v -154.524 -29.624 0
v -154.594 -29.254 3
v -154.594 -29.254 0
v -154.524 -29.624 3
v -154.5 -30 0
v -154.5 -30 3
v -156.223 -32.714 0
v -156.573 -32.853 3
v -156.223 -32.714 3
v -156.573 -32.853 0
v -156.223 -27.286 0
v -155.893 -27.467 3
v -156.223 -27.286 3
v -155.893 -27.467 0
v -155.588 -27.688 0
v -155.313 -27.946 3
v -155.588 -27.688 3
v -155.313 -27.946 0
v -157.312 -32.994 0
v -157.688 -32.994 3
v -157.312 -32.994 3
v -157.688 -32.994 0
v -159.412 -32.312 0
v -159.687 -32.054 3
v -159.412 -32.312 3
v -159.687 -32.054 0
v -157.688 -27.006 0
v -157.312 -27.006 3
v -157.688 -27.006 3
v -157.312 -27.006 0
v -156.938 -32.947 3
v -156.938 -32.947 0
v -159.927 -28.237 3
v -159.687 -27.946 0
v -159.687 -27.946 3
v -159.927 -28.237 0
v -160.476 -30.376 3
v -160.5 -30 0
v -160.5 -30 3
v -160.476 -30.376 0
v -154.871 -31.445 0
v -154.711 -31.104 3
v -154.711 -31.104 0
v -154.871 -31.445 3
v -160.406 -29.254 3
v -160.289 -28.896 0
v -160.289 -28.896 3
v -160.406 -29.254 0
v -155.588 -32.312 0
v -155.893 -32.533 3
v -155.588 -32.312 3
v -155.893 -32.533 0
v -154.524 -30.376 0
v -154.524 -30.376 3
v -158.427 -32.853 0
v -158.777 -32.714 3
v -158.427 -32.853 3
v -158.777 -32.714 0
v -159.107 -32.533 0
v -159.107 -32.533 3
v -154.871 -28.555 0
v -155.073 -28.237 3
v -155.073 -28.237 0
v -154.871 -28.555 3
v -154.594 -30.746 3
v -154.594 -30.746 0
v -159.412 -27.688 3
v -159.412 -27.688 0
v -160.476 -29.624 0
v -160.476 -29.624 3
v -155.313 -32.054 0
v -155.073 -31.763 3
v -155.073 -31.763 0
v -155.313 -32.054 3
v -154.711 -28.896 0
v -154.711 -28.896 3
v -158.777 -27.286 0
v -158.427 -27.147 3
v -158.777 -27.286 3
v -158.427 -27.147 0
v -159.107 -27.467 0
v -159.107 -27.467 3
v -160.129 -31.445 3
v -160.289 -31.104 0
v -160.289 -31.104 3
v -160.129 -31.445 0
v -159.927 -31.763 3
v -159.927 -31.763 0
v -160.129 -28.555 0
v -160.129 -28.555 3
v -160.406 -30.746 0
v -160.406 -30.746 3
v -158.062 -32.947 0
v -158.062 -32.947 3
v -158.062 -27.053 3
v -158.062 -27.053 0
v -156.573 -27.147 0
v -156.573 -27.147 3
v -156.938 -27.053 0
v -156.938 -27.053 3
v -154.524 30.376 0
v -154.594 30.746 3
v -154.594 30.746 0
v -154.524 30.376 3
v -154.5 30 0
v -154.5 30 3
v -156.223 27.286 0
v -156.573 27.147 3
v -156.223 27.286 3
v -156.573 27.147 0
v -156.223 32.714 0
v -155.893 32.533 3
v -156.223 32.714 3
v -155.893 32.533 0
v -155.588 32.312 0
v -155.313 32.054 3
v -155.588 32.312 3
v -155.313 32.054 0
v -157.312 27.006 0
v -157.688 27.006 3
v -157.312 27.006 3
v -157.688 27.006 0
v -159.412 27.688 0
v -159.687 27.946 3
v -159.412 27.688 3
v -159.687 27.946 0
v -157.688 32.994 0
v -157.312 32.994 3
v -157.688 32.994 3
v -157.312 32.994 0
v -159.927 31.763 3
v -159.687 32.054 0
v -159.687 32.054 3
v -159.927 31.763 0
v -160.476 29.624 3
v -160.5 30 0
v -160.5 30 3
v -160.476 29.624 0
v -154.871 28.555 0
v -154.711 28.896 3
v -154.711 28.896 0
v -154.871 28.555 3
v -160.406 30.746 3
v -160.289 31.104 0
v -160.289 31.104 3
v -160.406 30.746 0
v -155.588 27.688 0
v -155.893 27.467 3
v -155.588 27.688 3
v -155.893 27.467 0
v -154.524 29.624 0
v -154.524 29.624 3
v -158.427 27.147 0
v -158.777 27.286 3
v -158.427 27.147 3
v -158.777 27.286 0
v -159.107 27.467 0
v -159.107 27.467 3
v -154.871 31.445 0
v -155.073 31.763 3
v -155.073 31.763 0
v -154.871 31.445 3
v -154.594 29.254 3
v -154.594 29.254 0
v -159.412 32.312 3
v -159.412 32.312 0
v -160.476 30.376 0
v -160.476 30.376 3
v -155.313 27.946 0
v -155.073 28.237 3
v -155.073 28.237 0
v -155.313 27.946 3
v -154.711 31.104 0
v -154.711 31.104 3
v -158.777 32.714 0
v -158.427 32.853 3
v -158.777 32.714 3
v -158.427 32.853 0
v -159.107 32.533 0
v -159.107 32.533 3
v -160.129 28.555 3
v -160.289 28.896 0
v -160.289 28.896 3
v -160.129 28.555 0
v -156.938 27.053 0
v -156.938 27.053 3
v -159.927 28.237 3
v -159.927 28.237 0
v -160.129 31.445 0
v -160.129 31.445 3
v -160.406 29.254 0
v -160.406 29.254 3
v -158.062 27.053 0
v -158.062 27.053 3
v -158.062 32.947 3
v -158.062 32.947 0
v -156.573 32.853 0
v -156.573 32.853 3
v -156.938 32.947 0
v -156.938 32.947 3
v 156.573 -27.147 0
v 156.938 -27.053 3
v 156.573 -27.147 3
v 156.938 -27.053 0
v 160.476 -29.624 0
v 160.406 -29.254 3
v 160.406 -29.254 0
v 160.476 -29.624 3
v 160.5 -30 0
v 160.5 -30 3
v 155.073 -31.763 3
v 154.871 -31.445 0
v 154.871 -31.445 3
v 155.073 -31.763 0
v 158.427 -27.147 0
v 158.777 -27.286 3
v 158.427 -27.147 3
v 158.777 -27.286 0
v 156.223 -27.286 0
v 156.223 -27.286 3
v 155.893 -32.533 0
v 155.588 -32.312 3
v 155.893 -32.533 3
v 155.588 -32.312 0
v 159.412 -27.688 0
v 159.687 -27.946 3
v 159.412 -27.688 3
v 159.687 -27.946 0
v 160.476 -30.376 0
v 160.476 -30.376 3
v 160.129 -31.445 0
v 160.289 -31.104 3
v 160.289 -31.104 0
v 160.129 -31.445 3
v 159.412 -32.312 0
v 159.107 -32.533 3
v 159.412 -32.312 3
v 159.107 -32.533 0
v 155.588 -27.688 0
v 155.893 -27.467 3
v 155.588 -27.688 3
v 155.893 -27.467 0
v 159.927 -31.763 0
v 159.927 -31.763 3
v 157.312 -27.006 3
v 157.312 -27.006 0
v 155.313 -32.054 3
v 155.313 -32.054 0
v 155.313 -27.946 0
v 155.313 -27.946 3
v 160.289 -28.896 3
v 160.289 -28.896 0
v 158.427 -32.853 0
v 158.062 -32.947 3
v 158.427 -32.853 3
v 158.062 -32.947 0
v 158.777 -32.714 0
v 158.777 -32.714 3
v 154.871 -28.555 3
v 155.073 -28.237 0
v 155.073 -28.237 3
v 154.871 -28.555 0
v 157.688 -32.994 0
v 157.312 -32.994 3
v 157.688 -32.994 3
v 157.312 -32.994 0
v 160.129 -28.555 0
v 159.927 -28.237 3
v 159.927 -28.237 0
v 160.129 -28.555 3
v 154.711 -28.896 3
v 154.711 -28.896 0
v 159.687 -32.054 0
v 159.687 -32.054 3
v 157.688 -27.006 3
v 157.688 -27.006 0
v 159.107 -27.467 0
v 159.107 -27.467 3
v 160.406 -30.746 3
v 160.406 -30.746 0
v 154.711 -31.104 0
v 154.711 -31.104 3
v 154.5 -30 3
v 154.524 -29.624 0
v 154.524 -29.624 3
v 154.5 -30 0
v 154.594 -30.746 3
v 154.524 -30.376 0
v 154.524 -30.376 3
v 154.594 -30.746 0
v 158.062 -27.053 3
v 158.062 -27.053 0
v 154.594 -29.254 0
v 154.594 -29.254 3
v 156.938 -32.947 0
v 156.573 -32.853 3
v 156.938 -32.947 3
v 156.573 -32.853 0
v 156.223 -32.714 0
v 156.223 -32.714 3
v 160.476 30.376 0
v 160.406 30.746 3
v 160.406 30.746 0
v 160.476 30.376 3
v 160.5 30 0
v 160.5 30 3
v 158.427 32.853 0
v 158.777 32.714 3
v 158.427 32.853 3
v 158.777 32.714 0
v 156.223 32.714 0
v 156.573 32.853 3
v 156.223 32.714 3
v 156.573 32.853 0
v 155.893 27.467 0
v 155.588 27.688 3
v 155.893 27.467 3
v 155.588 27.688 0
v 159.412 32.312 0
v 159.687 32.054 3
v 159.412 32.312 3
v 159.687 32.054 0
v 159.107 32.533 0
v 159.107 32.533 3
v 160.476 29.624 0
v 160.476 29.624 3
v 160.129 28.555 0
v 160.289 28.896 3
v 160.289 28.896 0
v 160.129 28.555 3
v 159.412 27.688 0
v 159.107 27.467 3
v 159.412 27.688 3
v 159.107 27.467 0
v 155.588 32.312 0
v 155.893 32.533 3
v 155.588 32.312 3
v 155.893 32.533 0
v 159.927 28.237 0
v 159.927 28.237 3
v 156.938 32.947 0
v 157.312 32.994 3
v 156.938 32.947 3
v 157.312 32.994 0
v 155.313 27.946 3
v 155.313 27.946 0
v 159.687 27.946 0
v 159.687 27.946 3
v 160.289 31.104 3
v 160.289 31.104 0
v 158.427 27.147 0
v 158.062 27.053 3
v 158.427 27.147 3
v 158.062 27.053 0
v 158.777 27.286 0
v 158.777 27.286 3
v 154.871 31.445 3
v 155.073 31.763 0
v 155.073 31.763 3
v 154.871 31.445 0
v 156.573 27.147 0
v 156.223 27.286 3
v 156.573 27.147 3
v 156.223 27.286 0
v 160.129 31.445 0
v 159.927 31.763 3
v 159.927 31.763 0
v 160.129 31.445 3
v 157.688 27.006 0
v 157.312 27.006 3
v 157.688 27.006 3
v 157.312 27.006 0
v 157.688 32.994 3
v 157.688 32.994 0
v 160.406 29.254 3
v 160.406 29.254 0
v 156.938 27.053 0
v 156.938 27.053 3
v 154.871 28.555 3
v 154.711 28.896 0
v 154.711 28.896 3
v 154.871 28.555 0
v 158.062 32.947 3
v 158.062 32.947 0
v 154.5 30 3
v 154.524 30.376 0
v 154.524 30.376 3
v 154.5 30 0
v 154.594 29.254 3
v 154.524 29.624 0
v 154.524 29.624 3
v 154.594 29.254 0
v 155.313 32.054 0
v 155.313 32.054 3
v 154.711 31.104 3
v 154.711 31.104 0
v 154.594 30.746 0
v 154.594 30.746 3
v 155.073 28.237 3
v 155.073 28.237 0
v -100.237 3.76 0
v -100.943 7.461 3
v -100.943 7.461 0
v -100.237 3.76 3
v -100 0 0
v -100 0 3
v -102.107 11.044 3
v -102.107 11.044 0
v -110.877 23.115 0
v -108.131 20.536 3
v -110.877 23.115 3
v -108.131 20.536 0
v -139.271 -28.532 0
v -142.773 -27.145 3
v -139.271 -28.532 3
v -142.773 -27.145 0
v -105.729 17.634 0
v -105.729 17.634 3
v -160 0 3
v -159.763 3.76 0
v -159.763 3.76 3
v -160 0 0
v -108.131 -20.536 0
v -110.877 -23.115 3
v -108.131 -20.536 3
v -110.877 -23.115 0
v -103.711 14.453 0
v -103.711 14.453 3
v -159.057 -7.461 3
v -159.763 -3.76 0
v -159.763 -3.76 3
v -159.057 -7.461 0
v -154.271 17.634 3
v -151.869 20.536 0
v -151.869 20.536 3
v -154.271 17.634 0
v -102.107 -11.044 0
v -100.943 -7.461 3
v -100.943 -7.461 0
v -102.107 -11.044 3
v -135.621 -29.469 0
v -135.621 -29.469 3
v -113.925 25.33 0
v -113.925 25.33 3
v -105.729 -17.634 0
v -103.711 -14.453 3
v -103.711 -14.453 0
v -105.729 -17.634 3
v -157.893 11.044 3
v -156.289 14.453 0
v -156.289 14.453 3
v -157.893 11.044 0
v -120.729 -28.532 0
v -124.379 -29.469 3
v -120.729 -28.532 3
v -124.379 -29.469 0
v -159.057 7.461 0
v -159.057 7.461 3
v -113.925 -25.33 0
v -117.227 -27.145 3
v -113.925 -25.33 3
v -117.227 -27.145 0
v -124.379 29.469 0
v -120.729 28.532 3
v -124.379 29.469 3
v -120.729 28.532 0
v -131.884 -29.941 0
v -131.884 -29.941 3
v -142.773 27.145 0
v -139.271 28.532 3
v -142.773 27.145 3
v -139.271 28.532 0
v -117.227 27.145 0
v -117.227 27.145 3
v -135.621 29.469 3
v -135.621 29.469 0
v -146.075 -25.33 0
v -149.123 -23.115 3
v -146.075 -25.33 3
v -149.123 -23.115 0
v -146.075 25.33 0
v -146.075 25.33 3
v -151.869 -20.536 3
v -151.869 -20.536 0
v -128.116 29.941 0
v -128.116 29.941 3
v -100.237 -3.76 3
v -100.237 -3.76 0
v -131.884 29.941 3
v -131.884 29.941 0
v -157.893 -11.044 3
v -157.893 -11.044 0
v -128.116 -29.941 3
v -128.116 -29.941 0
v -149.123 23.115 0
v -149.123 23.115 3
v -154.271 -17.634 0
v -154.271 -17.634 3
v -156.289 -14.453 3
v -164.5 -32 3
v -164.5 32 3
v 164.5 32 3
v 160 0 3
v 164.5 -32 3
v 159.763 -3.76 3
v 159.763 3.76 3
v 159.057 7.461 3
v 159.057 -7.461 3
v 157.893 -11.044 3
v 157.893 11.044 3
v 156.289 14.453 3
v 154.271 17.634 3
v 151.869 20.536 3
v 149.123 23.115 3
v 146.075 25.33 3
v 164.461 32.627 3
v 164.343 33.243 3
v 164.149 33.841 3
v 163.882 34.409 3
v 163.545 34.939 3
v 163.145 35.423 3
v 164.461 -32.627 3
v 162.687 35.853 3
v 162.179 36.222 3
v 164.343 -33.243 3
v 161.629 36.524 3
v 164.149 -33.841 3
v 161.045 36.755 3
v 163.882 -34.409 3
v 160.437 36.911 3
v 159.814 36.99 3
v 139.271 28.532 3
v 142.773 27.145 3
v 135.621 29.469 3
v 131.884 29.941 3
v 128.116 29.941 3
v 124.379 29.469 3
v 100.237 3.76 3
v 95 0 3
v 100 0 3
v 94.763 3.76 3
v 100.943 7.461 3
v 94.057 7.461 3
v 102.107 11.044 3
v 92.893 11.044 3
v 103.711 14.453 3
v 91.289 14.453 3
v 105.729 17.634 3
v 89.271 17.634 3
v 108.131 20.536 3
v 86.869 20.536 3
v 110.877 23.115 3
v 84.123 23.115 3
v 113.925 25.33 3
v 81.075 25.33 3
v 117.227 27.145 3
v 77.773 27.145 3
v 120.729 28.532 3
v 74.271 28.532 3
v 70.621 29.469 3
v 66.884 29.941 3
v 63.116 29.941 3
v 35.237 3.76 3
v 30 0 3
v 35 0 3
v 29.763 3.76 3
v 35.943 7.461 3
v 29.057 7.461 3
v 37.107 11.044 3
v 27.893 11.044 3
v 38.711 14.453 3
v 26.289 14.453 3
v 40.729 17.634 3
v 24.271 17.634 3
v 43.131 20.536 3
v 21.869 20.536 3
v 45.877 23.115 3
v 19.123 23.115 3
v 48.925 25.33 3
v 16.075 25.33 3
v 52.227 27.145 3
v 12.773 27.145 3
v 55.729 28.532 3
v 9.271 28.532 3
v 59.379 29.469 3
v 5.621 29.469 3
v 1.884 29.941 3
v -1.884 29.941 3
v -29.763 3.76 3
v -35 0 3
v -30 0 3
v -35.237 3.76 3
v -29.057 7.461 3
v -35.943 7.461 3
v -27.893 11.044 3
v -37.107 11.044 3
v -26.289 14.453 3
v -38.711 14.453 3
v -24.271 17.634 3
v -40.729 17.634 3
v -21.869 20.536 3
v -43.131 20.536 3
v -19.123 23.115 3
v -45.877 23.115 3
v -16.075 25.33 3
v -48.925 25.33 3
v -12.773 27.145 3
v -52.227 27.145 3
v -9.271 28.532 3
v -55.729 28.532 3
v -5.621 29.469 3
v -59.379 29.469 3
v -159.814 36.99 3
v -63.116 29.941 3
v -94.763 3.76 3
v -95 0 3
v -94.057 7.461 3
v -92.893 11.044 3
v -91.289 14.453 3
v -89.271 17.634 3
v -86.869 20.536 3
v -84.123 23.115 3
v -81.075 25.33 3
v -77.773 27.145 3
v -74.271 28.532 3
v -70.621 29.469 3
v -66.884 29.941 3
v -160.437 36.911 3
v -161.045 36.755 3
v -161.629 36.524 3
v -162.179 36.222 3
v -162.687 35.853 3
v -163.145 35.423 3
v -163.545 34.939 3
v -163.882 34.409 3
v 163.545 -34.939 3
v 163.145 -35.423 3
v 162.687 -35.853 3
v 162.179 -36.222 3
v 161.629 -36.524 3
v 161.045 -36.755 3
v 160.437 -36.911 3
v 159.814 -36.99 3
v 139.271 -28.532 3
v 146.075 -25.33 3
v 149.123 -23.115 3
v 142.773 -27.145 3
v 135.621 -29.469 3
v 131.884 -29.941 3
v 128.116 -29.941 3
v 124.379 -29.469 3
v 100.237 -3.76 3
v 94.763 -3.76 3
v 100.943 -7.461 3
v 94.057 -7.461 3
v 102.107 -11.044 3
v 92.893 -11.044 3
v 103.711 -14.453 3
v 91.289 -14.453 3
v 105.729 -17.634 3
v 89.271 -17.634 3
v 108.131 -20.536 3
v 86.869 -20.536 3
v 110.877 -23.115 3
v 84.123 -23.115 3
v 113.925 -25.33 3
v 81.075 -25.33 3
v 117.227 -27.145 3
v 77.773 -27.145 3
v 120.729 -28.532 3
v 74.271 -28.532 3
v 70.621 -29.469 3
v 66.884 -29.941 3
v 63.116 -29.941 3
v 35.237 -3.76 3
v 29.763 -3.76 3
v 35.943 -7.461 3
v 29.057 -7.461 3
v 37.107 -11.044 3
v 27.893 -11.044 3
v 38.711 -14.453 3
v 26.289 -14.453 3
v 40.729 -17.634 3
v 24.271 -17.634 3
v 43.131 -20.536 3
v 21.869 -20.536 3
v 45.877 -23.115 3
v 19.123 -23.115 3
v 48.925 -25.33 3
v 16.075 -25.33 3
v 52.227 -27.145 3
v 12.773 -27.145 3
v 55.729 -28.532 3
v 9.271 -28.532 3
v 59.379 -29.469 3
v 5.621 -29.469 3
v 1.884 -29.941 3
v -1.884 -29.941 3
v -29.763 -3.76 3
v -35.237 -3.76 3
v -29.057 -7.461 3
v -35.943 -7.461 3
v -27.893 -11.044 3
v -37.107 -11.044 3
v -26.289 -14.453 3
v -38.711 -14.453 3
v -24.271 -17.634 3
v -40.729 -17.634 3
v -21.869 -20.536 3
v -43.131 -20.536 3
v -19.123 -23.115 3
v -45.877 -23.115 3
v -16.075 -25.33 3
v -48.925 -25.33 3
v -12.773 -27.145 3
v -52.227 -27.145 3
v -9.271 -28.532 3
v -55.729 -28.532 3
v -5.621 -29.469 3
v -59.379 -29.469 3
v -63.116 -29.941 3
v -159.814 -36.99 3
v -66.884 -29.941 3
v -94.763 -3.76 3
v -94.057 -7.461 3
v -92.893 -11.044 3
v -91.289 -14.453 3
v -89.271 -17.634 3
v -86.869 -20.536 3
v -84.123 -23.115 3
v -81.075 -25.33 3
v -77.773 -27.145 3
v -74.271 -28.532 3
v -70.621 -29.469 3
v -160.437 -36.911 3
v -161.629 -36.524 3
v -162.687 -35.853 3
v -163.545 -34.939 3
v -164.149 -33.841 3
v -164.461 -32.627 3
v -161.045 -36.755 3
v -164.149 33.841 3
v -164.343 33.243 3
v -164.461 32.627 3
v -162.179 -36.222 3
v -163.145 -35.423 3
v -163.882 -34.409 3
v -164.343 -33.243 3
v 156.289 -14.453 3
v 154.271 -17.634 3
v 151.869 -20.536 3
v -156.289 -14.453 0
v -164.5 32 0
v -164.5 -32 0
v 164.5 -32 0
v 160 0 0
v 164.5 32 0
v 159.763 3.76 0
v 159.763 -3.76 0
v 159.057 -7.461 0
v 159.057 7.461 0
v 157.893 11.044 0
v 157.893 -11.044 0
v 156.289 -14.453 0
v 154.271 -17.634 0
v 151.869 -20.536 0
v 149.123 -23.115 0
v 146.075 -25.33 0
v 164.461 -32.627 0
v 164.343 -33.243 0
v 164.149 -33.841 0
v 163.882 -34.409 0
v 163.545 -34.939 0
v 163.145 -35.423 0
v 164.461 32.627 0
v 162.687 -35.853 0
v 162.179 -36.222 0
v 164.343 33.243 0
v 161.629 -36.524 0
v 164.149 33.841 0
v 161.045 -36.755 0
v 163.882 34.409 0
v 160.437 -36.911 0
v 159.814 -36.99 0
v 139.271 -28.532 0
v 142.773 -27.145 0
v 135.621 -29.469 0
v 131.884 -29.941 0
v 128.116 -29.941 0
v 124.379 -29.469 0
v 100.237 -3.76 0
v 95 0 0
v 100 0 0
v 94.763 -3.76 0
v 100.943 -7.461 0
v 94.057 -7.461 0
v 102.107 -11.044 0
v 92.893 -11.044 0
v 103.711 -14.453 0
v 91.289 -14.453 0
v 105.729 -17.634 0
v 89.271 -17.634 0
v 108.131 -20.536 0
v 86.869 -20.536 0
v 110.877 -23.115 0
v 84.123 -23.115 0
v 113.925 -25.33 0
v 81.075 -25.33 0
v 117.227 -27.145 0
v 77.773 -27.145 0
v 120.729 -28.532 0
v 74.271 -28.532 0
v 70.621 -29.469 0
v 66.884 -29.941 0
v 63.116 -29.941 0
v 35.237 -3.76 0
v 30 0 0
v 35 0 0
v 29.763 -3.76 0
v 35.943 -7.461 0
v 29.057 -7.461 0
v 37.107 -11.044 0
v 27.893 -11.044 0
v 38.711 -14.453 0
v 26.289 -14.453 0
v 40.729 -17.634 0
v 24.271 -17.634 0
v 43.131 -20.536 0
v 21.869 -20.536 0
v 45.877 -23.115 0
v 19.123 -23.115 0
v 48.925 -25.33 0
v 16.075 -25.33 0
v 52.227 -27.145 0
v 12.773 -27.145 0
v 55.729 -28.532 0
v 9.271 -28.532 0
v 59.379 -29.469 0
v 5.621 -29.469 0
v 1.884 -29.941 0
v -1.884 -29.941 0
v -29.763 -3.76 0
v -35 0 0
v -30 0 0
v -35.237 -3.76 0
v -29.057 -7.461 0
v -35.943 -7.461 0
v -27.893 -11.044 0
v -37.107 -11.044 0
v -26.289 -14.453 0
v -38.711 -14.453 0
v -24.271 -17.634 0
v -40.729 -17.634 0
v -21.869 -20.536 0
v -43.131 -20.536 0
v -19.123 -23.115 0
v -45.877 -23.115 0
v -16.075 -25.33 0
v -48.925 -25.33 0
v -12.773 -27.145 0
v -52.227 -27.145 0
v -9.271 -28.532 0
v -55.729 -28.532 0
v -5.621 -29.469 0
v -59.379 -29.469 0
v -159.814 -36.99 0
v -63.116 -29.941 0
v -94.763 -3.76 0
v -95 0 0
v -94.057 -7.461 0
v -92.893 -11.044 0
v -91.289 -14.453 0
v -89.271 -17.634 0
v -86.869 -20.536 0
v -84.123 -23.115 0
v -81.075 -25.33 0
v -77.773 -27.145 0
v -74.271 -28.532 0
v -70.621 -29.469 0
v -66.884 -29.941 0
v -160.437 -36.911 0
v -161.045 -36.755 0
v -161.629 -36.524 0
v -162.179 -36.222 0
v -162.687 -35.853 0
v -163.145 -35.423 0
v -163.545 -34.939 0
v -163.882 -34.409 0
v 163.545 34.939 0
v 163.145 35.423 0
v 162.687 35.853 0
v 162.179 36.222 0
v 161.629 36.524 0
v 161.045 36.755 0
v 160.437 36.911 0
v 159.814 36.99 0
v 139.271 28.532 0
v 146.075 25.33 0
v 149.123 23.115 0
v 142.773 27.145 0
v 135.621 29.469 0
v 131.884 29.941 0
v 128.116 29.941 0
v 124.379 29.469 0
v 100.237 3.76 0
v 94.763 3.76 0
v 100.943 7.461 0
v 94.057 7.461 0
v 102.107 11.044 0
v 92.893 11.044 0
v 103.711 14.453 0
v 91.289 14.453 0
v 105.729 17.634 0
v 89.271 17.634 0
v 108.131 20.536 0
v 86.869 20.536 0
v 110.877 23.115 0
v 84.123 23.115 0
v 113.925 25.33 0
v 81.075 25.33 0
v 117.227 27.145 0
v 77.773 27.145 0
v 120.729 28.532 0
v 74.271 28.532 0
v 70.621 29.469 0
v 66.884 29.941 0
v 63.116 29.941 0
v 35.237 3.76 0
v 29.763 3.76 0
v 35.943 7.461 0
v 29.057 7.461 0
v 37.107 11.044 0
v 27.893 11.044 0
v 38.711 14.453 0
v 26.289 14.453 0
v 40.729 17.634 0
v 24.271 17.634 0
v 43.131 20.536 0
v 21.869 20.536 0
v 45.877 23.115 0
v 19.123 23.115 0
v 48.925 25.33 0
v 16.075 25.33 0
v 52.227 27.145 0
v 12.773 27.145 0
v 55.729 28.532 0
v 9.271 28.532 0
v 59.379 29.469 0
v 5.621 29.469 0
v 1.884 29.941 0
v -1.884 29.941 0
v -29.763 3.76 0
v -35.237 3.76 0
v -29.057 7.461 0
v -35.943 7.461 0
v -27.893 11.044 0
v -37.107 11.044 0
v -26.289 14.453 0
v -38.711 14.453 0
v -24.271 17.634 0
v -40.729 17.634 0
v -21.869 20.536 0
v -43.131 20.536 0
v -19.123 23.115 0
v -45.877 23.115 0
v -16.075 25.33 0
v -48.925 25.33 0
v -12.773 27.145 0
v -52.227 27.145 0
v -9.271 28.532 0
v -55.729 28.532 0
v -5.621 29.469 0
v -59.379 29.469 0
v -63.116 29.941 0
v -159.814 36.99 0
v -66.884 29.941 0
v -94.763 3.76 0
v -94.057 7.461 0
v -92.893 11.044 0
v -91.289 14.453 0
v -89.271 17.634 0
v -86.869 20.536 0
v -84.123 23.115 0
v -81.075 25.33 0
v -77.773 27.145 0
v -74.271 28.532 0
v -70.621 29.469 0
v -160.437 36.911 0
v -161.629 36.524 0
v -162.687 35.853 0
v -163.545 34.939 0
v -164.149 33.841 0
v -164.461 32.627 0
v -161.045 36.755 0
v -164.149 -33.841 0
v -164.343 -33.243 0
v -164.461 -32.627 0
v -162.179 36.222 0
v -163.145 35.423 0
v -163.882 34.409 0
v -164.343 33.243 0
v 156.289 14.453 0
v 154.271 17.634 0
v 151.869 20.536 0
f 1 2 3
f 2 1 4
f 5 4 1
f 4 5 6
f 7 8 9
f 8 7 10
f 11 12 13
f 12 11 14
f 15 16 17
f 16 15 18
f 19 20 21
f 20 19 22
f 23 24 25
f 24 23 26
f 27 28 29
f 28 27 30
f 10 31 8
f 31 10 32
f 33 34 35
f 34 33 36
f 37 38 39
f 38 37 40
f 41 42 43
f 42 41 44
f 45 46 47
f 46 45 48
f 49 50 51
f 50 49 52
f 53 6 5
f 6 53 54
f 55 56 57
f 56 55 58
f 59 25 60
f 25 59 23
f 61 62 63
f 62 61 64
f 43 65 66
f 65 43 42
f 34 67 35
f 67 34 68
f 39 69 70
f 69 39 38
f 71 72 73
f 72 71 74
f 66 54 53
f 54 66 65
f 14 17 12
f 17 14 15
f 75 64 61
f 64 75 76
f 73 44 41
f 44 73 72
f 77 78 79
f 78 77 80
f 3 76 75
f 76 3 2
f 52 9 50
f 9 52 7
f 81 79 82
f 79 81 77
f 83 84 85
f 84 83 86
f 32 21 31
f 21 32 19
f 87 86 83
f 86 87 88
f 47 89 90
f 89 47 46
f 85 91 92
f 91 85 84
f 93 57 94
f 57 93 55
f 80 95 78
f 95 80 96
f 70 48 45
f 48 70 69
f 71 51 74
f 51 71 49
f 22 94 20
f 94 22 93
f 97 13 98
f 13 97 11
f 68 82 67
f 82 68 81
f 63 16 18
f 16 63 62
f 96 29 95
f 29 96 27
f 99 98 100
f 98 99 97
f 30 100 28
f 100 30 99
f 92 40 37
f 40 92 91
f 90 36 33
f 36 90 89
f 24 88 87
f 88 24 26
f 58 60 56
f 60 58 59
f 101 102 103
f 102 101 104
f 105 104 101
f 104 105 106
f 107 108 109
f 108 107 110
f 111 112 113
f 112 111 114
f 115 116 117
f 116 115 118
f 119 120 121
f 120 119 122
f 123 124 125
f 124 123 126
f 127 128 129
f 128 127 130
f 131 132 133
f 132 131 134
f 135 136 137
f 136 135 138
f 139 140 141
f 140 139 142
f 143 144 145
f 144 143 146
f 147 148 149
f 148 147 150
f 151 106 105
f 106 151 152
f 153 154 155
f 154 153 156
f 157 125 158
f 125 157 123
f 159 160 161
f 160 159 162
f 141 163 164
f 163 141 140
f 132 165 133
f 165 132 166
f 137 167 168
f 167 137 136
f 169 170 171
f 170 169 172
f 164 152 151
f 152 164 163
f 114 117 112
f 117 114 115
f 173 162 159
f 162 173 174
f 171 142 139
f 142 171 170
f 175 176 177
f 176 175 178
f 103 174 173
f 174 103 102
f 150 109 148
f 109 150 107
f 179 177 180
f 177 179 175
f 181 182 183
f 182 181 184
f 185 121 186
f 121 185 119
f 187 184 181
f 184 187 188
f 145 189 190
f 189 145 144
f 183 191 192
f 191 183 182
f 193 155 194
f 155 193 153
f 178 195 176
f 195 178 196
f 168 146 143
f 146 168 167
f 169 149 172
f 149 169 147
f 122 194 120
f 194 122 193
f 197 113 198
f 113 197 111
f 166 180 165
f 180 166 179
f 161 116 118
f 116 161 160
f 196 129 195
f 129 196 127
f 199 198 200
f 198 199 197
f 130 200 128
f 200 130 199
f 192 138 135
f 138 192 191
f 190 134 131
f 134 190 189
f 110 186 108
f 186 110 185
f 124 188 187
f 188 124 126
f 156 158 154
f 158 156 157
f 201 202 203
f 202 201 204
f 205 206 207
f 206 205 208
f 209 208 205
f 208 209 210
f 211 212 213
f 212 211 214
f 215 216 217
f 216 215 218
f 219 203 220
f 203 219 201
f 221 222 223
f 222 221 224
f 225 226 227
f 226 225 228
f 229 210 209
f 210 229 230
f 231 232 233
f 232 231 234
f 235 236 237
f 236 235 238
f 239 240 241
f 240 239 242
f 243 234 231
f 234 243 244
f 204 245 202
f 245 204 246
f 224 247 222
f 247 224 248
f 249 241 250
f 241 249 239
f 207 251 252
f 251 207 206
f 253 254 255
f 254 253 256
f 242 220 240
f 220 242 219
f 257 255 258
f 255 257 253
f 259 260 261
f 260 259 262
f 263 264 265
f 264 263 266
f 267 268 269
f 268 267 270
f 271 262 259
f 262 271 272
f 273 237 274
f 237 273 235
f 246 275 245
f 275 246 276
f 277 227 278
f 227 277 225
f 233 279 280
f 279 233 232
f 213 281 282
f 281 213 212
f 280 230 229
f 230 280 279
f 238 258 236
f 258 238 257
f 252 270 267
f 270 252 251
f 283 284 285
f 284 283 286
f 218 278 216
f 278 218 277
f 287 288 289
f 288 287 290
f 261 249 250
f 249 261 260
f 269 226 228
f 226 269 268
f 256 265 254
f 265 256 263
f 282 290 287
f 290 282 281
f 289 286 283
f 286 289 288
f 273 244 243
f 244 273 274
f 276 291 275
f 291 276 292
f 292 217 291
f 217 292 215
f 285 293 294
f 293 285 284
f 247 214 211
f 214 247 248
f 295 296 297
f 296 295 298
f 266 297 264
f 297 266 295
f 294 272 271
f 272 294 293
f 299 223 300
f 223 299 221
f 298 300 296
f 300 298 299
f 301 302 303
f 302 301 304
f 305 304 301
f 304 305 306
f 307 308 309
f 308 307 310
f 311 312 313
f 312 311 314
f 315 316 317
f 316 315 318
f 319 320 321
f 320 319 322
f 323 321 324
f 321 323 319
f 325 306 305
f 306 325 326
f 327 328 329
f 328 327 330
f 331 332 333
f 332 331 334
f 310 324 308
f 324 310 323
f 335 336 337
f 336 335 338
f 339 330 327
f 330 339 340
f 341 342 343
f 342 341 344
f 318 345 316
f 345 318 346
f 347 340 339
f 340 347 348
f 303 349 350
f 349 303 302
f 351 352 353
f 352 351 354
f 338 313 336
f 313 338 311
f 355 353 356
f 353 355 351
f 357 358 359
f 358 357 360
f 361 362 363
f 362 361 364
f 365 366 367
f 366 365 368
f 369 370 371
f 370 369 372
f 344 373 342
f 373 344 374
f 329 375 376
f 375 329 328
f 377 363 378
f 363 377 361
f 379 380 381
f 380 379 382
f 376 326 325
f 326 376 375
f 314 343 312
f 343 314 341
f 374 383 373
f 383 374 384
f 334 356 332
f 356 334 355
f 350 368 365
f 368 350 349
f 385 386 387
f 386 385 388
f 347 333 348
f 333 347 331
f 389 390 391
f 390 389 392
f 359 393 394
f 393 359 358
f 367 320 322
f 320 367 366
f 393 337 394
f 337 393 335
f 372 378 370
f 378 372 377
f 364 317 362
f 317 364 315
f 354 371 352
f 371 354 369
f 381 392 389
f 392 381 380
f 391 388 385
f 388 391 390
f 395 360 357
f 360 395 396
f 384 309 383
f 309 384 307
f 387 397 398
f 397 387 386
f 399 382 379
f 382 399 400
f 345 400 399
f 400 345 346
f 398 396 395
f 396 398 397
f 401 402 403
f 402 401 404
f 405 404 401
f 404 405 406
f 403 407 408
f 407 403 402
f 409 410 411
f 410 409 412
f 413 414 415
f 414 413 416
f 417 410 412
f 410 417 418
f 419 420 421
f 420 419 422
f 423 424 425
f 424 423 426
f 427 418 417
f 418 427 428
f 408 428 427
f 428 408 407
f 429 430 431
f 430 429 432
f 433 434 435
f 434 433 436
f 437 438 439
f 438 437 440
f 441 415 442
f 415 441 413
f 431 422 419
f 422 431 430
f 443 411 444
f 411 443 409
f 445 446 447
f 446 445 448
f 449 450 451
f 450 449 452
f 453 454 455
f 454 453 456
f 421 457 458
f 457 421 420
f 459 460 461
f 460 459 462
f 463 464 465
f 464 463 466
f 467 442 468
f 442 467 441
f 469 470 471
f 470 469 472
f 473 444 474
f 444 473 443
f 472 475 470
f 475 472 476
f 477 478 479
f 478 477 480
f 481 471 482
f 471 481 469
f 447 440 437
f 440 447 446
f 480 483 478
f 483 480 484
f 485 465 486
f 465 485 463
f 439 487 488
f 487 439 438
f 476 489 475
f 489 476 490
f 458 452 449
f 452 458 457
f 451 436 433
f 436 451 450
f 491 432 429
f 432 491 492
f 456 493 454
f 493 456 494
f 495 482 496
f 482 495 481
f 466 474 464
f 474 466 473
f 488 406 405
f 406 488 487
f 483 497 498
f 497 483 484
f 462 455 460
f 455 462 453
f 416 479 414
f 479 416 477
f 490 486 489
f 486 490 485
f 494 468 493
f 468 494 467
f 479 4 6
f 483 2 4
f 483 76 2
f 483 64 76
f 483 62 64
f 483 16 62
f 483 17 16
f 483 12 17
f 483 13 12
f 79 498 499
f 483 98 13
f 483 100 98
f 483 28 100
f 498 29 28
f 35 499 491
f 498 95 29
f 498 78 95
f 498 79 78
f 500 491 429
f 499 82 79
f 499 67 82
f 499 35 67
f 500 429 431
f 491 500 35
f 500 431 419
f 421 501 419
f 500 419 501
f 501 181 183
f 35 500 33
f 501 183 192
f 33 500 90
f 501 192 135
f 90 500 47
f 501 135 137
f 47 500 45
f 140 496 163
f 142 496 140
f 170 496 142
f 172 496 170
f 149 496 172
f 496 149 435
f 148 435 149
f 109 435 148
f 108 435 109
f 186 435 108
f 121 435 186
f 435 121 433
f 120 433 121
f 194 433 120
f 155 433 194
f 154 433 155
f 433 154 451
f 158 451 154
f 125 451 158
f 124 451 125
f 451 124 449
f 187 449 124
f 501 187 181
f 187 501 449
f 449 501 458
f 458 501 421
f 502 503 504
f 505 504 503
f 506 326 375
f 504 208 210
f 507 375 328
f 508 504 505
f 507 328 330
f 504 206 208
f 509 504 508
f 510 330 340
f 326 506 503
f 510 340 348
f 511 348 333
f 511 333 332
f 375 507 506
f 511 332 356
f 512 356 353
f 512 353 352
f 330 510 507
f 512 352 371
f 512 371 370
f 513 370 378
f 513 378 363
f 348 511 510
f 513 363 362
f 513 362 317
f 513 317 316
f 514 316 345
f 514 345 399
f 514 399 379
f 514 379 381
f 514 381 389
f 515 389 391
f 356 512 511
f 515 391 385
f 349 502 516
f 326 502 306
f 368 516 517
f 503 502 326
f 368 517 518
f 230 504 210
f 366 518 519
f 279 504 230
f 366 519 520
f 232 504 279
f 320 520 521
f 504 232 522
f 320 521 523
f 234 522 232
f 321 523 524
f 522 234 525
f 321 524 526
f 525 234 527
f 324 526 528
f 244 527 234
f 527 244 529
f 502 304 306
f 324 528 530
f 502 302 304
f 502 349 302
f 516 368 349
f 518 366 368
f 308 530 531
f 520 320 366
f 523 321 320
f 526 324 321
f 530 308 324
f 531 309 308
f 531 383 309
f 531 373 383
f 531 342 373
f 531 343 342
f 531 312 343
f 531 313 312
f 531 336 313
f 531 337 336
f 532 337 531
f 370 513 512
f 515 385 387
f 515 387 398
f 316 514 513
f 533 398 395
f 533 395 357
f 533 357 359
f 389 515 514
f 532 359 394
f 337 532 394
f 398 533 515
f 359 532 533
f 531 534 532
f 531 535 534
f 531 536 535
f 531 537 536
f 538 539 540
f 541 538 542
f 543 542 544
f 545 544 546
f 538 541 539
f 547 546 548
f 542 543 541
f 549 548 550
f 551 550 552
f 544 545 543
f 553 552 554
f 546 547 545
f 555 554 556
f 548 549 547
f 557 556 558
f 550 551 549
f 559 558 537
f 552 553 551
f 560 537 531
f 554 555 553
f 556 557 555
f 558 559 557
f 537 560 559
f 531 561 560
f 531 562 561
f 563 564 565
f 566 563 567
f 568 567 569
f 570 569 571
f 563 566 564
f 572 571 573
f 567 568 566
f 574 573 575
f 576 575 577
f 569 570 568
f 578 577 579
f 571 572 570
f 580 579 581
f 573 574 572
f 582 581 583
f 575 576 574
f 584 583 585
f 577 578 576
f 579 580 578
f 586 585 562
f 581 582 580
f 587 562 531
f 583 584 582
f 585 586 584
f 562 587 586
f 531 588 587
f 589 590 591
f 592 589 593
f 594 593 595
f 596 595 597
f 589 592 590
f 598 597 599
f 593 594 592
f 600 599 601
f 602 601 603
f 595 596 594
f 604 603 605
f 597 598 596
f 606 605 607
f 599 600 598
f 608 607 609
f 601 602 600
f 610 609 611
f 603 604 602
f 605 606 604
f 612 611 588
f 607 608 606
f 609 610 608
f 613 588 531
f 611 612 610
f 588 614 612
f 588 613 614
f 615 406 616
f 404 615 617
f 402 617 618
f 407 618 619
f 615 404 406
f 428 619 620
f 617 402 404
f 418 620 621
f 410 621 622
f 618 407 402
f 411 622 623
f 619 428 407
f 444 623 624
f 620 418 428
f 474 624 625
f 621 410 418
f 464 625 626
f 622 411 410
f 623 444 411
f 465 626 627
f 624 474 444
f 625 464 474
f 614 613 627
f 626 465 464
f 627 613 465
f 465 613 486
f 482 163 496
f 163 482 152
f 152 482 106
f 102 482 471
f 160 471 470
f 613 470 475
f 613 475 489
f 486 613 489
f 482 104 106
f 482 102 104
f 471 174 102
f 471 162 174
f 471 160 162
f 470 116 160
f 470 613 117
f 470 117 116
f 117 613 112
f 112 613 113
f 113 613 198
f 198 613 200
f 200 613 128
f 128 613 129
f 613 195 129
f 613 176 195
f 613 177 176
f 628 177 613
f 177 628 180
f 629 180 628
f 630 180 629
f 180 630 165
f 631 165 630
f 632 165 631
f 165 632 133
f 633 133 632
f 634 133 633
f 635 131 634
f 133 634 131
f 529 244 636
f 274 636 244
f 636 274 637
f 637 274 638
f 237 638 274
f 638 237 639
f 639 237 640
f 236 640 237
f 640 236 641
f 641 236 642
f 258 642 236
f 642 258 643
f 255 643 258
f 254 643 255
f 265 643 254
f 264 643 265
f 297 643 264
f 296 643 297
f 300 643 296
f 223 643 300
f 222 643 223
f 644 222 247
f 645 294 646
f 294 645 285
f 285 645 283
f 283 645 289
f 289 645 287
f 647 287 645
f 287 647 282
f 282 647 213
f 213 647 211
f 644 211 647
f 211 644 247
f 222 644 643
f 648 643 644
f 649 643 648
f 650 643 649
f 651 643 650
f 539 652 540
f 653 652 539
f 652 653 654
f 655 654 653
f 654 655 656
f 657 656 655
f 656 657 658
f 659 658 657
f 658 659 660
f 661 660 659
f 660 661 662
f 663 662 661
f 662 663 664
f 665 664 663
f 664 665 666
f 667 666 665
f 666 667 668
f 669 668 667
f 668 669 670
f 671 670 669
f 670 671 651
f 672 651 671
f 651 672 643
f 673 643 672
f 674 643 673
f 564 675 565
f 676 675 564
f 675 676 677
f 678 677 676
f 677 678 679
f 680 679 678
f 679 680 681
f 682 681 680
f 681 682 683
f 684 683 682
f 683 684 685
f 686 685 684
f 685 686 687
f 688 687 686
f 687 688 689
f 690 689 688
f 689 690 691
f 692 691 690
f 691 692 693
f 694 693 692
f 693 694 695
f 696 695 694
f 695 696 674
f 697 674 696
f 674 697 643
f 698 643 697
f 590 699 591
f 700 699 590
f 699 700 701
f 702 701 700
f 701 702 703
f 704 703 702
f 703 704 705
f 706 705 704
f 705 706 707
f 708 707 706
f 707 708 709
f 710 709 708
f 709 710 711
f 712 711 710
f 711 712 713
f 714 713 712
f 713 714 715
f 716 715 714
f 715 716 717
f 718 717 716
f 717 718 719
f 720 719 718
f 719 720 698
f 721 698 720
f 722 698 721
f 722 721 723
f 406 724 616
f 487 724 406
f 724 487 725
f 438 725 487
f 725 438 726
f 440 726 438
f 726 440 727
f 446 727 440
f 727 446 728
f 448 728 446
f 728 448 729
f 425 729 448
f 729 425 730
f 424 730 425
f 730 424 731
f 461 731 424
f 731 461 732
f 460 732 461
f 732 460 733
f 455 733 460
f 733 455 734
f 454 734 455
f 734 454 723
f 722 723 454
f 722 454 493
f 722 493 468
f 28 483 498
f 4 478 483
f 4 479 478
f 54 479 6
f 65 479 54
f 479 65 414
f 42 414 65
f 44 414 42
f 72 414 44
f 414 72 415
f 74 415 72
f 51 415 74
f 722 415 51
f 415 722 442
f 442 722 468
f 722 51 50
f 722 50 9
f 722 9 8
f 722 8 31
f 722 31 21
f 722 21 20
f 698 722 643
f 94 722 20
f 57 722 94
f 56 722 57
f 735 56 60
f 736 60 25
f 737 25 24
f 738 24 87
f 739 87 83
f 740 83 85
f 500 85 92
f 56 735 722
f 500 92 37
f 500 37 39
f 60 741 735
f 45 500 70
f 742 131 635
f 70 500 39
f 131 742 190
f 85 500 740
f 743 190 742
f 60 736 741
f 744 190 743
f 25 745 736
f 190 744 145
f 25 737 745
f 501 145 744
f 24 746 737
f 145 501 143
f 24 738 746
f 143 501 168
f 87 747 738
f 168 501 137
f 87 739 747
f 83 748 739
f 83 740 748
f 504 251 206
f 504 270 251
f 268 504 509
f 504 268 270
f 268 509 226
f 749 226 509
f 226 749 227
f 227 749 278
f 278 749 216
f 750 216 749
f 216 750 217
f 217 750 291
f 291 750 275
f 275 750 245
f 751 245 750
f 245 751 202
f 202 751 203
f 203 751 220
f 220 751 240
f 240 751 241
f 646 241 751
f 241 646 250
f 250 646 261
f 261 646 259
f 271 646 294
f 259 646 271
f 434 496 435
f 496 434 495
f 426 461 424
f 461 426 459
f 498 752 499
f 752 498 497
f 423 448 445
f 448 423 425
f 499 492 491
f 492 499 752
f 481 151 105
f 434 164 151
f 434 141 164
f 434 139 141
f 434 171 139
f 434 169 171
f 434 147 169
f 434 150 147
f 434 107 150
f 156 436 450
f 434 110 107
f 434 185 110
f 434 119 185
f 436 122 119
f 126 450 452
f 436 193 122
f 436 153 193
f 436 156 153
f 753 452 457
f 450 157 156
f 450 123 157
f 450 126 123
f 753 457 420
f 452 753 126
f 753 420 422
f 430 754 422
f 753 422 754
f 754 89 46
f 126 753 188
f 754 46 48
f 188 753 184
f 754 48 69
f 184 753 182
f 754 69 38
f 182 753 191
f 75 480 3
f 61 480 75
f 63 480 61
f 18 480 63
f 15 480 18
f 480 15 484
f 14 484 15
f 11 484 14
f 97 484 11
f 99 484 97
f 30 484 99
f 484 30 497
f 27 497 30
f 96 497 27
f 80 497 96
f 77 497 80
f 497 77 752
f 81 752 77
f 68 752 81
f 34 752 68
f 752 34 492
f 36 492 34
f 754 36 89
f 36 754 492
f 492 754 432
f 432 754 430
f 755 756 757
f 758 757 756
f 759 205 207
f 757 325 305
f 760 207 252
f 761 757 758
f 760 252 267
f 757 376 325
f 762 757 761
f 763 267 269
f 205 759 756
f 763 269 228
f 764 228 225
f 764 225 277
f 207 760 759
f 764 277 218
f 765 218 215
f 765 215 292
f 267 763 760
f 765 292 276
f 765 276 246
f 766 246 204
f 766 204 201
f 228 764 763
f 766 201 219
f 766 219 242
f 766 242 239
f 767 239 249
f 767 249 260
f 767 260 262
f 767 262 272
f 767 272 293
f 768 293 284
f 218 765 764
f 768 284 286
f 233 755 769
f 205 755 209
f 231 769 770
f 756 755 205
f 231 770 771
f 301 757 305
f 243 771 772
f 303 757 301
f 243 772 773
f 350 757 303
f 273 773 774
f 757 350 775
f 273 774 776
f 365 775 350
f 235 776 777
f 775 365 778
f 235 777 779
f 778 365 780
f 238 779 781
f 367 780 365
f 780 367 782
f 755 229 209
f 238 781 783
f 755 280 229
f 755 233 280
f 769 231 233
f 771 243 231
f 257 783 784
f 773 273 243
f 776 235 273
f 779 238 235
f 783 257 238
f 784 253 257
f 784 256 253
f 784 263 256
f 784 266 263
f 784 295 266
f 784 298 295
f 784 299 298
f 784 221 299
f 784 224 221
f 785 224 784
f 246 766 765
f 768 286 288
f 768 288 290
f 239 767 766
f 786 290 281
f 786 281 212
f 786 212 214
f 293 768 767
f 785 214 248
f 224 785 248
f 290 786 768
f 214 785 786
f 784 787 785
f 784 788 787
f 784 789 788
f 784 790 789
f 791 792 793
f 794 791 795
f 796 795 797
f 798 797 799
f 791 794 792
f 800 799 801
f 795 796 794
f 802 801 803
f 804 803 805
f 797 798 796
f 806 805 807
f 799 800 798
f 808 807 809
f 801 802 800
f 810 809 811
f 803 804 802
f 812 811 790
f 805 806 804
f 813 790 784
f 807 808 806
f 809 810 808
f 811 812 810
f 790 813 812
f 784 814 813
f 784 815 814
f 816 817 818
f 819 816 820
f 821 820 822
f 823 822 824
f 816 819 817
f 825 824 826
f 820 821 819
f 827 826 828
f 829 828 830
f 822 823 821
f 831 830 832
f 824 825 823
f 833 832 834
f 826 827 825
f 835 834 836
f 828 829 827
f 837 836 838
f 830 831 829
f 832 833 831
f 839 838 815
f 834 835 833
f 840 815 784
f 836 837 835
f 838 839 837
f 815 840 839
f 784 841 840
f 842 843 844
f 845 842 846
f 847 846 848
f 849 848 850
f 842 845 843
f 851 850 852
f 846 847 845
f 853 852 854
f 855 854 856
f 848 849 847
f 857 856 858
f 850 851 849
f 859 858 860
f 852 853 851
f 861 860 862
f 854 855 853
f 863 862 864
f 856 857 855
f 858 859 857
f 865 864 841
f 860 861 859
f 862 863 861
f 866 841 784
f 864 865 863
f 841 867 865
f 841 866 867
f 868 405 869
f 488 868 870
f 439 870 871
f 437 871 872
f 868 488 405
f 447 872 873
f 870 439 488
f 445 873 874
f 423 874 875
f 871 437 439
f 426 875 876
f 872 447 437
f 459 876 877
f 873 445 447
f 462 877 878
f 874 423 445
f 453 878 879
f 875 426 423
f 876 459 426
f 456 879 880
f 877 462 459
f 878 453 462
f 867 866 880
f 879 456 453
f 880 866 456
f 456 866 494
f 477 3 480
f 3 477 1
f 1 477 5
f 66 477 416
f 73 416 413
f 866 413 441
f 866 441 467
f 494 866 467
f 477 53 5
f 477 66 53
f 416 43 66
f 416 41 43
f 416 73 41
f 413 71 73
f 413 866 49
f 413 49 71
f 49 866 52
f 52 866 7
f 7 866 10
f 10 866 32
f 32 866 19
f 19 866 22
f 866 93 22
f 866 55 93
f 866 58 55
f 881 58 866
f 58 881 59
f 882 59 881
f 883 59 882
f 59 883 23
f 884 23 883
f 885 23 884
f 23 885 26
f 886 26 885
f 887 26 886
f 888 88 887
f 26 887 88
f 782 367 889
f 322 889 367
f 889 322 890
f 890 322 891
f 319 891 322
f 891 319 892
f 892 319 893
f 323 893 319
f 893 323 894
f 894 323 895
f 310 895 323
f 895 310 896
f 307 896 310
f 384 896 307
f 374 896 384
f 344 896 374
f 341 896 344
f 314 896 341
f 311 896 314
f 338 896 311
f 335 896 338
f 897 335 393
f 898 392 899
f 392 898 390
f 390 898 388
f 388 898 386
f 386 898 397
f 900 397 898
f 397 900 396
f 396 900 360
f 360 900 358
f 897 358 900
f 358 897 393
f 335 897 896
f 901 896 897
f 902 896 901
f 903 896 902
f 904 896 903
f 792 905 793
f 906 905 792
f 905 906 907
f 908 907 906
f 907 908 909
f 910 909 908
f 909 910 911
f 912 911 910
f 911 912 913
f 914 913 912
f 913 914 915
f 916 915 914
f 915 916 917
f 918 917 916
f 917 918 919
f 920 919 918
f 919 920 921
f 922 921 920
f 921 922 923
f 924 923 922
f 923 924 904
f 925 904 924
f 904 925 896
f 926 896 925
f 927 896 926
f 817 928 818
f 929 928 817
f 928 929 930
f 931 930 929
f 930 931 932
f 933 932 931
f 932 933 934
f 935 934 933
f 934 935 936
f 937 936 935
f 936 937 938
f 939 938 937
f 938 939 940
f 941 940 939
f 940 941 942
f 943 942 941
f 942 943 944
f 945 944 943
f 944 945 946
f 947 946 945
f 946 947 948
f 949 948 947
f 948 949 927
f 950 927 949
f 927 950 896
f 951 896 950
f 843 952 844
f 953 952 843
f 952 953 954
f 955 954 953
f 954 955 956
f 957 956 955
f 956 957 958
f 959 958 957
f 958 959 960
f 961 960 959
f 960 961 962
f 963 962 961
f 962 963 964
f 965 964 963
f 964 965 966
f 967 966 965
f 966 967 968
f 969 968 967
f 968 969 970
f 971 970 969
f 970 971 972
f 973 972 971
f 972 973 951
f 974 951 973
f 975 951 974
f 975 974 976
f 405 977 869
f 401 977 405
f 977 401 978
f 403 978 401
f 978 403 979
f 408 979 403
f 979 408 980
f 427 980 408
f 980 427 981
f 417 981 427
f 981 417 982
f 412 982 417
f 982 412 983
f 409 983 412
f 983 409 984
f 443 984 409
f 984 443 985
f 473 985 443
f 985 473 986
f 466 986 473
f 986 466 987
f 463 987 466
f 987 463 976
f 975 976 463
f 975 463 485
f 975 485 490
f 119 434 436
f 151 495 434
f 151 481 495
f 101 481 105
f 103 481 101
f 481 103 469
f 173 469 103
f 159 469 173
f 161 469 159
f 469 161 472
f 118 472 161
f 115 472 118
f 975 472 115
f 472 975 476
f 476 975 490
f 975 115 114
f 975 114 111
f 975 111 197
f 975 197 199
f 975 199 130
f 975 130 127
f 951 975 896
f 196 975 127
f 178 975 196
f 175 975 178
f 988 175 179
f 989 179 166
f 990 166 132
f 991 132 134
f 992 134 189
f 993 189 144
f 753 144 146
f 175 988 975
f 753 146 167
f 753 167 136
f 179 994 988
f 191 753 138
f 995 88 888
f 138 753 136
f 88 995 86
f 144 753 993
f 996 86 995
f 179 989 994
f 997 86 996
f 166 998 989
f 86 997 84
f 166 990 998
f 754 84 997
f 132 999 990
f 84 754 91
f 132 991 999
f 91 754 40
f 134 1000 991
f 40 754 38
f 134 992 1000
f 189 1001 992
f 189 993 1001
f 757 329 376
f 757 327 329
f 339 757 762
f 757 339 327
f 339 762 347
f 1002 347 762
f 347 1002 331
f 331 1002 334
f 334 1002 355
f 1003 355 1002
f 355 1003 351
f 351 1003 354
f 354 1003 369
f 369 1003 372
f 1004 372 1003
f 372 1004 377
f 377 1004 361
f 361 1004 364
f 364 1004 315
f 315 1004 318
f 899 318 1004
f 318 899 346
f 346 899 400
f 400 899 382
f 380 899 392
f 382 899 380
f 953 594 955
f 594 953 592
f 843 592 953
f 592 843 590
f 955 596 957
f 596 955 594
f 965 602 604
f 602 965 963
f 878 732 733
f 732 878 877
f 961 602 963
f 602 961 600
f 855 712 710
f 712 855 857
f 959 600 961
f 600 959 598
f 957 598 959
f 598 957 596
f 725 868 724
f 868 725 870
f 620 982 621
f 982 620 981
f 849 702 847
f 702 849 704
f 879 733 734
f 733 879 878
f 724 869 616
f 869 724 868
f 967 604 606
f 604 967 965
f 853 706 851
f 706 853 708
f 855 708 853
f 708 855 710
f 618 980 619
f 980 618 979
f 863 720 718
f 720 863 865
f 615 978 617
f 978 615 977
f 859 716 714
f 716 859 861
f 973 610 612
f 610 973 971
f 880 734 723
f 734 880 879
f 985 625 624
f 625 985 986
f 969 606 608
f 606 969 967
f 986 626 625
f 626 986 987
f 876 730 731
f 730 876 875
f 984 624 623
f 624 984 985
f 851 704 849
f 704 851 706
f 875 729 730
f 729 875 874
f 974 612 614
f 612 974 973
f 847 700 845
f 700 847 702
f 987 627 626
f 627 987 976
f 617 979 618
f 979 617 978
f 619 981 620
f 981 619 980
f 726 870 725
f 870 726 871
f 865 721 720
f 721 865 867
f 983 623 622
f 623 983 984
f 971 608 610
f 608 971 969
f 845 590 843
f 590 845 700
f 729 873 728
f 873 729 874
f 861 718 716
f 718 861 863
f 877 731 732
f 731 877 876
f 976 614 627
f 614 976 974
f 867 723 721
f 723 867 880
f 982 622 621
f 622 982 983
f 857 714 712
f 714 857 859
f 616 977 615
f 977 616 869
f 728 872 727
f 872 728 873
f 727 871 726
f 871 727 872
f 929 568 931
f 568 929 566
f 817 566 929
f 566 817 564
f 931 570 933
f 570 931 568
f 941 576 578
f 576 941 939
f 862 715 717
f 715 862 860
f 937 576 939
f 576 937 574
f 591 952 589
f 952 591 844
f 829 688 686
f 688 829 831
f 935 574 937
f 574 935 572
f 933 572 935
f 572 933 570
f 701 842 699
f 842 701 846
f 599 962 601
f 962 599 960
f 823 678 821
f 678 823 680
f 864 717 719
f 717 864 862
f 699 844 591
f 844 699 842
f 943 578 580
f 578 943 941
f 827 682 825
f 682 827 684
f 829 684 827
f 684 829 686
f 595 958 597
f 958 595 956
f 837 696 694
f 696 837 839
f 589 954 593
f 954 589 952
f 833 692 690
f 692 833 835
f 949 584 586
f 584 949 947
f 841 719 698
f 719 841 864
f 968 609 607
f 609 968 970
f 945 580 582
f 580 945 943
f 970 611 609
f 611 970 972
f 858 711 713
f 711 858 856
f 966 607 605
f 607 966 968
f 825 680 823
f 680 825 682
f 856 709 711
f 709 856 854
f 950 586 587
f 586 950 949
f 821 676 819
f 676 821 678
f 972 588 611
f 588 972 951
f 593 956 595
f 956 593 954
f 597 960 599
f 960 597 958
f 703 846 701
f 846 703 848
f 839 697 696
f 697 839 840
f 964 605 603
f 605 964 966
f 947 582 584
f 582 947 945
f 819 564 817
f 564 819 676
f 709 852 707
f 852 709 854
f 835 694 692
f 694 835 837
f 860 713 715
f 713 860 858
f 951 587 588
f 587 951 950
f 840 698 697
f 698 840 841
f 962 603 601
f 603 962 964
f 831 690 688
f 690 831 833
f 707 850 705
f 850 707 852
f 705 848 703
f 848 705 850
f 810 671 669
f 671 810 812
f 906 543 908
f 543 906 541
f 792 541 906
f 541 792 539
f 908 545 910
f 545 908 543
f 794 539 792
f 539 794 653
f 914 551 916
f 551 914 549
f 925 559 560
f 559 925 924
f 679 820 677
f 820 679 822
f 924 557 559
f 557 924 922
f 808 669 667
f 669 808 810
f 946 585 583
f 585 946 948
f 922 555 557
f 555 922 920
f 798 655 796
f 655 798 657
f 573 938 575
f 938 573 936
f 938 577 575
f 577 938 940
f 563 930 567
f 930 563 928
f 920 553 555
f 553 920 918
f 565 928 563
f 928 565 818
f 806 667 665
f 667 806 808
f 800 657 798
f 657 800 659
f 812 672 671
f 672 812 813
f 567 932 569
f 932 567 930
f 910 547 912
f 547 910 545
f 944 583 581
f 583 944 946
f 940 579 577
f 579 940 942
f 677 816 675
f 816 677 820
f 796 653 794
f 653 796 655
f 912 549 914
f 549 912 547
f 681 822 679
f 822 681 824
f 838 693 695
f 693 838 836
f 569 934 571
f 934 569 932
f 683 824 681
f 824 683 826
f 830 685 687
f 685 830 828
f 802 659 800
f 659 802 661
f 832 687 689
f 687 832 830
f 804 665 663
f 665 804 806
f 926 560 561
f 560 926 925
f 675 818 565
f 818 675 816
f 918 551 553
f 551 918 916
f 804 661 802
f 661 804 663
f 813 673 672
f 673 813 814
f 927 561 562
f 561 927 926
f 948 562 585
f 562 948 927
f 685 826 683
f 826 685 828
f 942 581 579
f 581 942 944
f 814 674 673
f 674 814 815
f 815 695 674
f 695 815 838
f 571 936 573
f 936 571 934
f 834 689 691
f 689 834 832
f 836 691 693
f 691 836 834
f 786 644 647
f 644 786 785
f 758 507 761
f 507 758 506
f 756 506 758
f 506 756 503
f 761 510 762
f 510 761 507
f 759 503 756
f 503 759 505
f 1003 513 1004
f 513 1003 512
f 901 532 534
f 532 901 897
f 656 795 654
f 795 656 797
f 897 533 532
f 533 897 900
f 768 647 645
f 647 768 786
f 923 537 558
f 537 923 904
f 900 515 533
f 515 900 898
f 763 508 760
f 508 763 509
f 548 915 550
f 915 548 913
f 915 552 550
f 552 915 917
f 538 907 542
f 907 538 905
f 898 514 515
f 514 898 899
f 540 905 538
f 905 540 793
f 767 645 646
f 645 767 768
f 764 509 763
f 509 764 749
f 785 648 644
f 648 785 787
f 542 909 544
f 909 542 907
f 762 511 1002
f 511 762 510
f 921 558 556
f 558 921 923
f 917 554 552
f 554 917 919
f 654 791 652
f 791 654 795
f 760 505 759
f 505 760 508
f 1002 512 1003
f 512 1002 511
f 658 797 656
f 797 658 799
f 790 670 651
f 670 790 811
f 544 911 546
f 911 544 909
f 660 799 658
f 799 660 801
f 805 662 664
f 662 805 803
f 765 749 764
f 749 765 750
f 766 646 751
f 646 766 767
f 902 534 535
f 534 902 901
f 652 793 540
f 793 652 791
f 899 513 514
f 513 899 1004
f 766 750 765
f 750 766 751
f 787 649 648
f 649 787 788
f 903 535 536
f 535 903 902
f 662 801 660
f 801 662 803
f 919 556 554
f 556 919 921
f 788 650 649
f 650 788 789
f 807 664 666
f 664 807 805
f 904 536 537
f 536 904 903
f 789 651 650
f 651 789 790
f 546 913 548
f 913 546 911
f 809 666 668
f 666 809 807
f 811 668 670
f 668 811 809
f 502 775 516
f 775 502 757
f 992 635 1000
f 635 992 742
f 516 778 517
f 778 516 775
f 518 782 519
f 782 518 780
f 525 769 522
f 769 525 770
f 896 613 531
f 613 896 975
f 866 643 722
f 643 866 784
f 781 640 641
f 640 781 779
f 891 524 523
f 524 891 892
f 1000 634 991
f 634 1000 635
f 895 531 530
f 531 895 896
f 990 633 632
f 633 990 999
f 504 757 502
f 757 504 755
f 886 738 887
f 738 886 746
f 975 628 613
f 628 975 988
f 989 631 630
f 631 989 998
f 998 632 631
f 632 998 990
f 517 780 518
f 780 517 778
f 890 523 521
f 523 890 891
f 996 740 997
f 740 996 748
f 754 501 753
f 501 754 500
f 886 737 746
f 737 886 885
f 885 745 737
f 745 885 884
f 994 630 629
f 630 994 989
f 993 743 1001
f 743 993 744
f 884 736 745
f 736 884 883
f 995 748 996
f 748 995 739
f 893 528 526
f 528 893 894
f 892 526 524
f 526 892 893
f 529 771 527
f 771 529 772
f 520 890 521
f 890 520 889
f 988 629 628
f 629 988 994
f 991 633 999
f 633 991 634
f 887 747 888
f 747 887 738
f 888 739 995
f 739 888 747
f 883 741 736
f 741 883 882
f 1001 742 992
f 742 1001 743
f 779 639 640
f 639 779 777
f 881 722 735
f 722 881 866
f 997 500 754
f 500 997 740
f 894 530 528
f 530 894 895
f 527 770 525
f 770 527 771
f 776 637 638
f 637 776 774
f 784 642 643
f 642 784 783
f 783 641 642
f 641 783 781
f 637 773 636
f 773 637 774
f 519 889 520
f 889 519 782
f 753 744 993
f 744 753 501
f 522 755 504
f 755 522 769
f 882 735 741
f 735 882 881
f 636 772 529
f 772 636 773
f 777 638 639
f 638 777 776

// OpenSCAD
$fn = 50;


difference() {
	union() {
		hull() {
			translate(v = [-159.5000000000, 32.0000000000, 0]) {
				cylinder(h = 3, r = 5);
			}
			translate(v = [159.5000000000, 32.0000000000, 0]) {
				cylinder(h = 3, r = 5);
			}
			translate(v = [-159.5000000000, -32.0000000000, 0]) {
				cylinder(h = 3, r = 5);
			}
			translate(v = [159.5000000000, -32.0000000000, 0]) {
				cylinder(h = 3, r = 5);
			}
		}
	}
	union() {
		#translate(v = [-157.5000000000, -30.0000000000, -100.0000000000]) {
			cylinder(h = 200, r = 3.0000000000);
		}
		#translate(v = [-157.5000000000, 30.0000000000, -100.0000000000]) {
			cylinder(h = 200, r = 3.0000000000);
		}
		#translate(v = [157.5000000000, -30.0000000000, -100.0000000000]) {
			cylinder(h = 200, r = 3.0000000000);
		}
		#translate(v = [157.5000000000, 30.0000000000, -100.0000000000]) {
			cylinder(h = 200, r = 3.0000000000);
		}
		#translate(v = [-130.0000000000, 0, 0]) {
			cylinder(h = 3, r = 30.0000000000);
		}
		#translate(v = [-65.0000000000, 0, 0]) {
			cylinder(h = 3, r = 30.0000000000);
		}
		#cylinder(h = 3, r = 30.0000000000);
		#translate(v = [65.0000000000, 0, 0]) {
			cylinder(h = 3, r = 30.0000000000);
		}
		#translate(v = [130.0000000000, 0, 0]) {
			cylinder(h = 3, r = 30.0000000000);
		}
	}
}
